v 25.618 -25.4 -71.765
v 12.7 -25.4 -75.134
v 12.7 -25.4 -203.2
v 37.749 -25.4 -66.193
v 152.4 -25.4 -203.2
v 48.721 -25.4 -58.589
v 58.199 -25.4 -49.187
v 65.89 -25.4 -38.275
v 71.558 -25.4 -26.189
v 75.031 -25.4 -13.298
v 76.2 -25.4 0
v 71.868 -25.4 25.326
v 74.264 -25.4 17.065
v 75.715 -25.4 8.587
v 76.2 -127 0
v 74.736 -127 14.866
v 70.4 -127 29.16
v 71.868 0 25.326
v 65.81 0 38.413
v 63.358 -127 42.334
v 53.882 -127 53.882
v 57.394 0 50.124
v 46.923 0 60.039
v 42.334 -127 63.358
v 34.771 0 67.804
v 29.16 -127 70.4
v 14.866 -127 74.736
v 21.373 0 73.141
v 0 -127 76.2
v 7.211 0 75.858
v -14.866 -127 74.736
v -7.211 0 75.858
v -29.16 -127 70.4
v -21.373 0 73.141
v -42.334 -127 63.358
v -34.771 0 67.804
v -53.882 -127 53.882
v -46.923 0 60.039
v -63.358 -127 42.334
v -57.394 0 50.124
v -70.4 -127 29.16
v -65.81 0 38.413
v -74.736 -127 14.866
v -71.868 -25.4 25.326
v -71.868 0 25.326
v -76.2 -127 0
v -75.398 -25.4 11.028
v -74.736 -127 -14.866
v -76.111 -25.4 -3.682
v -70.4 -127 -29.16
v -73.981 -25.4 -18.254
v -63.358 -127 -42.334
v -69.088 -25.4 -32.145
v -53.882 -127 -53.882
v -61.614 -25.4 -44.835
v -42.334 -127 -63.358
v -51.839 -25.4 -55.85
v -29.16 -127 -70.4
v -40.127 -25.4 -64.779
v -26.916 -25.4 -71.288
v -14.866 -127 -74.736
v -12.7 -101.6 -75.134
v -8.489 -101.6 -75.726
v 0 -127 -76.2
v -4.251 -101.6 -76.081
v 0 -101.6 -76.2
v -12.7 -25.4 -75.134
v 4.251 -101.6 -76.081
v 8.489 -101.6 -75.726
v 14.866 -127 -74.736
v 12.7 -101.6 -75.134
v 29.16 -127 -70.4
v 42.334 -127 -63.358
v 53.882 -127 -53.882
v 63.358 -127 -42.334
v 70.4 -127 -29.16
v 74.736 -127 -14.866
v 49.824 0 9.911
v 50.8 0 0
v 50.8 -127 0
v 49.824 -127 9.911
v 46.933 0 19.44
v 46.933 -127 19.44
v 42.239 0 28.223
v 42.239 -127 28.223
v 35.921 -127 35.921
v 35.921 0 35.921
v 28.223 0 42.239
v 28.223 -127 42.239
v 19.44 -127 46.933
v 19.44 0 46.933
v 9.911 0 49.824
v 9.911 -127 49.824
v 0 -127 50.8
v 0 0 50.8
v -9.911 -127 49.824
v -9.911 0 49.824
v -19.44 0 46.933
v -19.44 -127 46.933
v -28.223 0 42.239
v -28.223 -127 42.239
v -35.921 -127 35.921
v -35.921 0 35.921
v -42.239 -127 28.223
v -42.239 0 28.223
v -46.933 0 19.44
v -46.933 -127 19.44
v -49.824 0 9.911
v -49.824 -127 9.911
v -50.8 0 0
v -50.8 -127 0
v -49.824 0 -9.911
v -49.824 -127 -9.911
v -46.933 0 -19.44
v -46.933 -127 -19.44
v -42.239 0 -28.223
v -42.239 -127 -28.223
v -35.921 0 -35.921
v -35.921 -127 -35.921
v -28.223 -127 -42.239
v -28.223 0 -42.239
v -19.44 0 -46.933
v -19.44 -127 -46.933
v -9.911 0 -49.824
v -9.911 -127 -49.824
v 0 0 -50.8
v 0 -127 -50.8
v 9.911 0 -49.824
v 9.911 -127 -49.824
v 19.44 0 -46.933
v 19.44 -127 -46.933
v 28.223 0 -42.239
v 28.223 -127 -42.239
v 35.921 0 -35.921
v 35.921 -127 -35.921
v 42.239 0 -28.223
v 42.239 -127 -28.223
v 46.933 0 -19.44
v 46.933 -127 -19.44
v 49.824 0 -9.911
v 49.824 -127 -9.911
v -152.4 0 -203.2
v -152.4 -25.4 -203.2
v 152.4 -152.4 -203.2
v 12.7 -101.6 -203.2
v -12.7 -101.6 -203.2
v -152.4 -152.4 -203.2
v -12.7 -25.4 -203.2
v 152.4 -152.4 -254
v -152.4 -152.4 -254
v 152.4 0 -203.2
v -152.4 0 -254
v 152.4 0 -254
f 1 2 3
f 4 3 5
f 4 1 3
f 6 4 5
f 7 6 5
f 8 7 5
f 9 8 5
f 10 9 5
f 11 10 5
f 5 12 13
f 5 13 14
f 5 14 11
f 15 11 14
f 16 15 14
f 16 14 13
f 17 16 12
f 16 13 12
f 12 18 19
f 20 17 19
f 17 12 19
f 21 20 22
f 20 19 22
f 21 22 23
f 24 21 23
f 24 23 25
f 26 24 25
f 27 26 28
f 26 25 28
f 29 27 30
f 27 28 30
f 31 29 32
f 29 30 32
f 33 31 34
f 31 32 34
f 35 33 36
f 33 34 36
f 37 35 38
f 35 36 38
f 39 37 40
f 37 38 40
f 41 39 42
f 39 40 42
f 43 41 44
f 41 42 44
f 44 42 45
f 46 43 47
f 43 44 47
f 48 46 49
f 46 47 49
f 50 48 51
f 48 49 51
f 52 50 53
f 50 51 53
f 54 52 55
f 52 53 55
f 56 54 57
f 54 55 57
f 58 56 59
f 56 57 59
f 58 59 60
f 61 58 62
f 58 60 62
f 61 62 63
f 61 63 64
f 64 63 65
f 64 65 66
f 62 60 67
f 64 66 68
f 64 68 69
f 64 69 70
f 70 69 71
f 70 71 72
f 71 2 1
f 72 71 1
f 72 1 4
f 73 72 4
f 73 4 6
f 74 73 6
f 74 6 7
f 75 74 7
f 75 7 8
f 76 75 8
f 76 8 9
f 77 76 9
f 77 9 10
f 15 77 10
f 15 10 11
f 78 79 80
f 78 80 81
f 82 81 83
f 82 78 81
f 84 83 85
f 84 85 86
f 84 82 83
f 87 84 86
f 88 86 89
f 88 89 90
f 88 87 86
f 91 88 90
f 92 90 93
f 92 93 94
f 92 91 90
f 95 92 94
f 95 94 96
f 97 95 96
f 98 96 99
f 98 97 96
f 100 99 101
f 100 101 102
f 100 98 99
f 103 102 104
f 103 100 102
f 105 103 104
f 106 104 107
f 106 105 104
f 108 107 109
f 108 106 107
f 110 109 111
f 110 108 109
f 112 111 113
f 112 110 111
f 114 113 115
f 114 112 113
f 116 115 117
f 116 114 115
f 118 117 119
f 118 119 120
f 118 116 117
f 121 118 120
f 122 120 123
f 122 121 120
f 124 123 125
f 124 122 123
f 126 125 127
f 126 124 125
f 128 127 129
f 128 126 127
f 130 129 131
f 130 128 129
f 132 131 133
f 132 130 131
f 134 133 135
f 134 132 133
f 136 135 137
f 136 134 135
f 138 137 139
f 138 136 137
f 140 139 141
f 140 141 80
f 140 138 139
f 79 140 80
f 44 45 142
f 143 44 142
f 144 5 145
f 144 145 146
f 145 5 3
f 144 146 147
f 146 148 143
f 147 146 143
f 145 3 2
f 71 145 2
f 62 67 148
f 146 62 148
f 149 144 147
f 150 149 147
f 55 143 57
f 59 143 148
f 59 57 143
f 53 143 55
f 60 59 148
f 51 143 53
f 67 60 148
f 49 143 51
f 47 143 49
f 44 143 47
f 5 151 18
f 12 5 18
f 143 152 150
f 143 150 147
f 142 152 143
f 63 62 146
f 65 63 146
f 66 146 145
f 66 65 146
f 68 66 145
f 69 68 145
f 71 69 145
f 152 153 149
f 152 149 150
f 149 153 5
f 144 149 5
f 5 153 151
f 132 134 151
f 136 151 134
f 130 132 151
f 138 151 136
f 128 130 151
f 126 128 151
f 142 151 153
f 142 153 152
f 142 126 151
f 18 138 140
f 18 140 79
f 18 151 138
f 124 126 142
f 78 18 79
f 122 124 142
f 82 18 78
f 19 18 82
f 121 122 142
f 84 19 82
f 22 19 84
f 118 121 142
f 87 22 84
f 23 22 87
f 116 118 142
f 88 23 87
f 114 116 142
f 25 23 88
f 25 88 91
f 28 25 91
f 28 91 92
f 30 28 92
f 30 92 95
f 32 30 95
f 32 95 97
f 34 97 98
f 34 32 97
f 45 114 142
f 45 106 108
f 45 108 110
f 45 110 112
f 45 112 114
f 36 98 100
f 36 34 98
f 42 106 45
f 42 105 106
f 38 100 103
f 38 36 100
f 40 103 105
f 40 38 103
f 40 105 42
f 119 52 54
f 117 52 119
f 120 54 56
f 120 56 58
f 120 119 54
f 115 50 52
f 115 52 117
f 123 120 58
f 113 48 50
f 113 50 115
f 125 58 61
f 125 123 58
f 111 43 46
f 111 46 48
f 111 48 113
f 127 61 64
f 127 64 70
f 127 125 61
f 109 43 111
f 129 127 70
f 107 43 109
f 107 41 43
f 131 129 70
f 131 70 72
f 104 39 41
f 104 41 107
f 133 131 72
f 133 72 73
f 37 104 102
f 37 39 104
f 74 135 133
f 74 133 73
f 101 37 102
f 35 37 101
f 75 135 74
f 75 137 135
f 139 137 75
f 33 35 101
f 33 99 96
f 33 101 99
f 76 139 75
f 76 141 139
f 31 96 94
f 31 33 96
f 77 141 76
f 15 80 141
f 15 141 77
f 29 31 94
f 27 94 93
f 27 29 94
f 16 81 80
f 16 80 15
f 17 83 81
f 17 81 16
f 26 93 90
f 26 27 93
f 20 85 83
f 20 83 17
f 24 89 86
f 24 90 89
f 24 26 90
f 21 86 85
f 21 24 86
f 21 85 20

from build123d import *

# Parameters (mm, degrees)
F0_R     = 76.2
F0_R_2   = 50.8
F1_DEPTH = 127
F3_DEPTH = 25.4
F4_W     = 304.8
F4_H     = 50.8
F5_DEPTH = 152.4
F7_DEPTH = 76.2


with BuildPart() as f1:
    # F0 (on Front) → F1 (new body)
    with BuildSketch(Plane.XZ):
        Circle(F0_R)
        Circle(F0_R_2, mode=Mode.SUBTRACT)
    extrude(amount=F1_DEPTH)

    # F2 (on Front) → F3 (join)
    with BuildSketch(Plane.XZ):
        with BuildLine():
            ThreePointArc((0, -76.2), (-62.1944082776, -44.0260783968), (-71.8681337184, 25.3261002888))
            Line((-71.8681337184, 25.3261002888), (-152.4, -203.2))
            Line((-152.4, -203.2), (0, -203.2))
            Line((0, -203.2), (0, -76.2))
        make_face()
        with BuildLine():
            ThreePointArc((71.8681337184, 25.3261002888), (62.1944082776, -44.0260783968), (0, -76.2))
            Line((0, -76.2), (0, -203.2))
            Line((0, -203.2), (152.4, -203.2))
            Line((152.4, -203.2), (71.8681337184, 25.3261002888))
        make_face()
    extrude(amount=F3_DEPTH)

    # F4 (on face) → F5 (join)
    with BuildSketch(Plane(origin=(0, 0, 0), x_dir=(-1, 0, 0), z_dir=(0, 1, 0))):
        with Locations((0, -228.6)):
            Rectangle(F4_W, F4_H)
    extrude(amount=-F5_DEPTH)

    # F6 (on face) → F7 (join)
    with BuildSketch(Plane.XZ.offset(25.4)):
        with BuildLine():
            Line((0, -203.2), (0, -76.2))
            ThreePointArc((0, -76.2), (-6.3723210333, -75.9330858365), (-12.7, -75.1342132454))
            Line((-12.7, -75.1342132454), (-12.7, -203.2))
            Line((-12.7, -203.2), (0, -203.2))
        make_face()
        with BuildLine():
            ThreePointArc((12.7, -75.1342132454), (6.3723210333, -75.9330858365), (0, -76.2))
            Line((0, -76.2), (0, -203.2))
            Line((0, -203.2), (12.7, -203.2))
            Line((12.7, -203.2), (12.7, -75.1342132454))
        make_face()
    extrude(amount=F7_DEPTH)


solid = f1.part
